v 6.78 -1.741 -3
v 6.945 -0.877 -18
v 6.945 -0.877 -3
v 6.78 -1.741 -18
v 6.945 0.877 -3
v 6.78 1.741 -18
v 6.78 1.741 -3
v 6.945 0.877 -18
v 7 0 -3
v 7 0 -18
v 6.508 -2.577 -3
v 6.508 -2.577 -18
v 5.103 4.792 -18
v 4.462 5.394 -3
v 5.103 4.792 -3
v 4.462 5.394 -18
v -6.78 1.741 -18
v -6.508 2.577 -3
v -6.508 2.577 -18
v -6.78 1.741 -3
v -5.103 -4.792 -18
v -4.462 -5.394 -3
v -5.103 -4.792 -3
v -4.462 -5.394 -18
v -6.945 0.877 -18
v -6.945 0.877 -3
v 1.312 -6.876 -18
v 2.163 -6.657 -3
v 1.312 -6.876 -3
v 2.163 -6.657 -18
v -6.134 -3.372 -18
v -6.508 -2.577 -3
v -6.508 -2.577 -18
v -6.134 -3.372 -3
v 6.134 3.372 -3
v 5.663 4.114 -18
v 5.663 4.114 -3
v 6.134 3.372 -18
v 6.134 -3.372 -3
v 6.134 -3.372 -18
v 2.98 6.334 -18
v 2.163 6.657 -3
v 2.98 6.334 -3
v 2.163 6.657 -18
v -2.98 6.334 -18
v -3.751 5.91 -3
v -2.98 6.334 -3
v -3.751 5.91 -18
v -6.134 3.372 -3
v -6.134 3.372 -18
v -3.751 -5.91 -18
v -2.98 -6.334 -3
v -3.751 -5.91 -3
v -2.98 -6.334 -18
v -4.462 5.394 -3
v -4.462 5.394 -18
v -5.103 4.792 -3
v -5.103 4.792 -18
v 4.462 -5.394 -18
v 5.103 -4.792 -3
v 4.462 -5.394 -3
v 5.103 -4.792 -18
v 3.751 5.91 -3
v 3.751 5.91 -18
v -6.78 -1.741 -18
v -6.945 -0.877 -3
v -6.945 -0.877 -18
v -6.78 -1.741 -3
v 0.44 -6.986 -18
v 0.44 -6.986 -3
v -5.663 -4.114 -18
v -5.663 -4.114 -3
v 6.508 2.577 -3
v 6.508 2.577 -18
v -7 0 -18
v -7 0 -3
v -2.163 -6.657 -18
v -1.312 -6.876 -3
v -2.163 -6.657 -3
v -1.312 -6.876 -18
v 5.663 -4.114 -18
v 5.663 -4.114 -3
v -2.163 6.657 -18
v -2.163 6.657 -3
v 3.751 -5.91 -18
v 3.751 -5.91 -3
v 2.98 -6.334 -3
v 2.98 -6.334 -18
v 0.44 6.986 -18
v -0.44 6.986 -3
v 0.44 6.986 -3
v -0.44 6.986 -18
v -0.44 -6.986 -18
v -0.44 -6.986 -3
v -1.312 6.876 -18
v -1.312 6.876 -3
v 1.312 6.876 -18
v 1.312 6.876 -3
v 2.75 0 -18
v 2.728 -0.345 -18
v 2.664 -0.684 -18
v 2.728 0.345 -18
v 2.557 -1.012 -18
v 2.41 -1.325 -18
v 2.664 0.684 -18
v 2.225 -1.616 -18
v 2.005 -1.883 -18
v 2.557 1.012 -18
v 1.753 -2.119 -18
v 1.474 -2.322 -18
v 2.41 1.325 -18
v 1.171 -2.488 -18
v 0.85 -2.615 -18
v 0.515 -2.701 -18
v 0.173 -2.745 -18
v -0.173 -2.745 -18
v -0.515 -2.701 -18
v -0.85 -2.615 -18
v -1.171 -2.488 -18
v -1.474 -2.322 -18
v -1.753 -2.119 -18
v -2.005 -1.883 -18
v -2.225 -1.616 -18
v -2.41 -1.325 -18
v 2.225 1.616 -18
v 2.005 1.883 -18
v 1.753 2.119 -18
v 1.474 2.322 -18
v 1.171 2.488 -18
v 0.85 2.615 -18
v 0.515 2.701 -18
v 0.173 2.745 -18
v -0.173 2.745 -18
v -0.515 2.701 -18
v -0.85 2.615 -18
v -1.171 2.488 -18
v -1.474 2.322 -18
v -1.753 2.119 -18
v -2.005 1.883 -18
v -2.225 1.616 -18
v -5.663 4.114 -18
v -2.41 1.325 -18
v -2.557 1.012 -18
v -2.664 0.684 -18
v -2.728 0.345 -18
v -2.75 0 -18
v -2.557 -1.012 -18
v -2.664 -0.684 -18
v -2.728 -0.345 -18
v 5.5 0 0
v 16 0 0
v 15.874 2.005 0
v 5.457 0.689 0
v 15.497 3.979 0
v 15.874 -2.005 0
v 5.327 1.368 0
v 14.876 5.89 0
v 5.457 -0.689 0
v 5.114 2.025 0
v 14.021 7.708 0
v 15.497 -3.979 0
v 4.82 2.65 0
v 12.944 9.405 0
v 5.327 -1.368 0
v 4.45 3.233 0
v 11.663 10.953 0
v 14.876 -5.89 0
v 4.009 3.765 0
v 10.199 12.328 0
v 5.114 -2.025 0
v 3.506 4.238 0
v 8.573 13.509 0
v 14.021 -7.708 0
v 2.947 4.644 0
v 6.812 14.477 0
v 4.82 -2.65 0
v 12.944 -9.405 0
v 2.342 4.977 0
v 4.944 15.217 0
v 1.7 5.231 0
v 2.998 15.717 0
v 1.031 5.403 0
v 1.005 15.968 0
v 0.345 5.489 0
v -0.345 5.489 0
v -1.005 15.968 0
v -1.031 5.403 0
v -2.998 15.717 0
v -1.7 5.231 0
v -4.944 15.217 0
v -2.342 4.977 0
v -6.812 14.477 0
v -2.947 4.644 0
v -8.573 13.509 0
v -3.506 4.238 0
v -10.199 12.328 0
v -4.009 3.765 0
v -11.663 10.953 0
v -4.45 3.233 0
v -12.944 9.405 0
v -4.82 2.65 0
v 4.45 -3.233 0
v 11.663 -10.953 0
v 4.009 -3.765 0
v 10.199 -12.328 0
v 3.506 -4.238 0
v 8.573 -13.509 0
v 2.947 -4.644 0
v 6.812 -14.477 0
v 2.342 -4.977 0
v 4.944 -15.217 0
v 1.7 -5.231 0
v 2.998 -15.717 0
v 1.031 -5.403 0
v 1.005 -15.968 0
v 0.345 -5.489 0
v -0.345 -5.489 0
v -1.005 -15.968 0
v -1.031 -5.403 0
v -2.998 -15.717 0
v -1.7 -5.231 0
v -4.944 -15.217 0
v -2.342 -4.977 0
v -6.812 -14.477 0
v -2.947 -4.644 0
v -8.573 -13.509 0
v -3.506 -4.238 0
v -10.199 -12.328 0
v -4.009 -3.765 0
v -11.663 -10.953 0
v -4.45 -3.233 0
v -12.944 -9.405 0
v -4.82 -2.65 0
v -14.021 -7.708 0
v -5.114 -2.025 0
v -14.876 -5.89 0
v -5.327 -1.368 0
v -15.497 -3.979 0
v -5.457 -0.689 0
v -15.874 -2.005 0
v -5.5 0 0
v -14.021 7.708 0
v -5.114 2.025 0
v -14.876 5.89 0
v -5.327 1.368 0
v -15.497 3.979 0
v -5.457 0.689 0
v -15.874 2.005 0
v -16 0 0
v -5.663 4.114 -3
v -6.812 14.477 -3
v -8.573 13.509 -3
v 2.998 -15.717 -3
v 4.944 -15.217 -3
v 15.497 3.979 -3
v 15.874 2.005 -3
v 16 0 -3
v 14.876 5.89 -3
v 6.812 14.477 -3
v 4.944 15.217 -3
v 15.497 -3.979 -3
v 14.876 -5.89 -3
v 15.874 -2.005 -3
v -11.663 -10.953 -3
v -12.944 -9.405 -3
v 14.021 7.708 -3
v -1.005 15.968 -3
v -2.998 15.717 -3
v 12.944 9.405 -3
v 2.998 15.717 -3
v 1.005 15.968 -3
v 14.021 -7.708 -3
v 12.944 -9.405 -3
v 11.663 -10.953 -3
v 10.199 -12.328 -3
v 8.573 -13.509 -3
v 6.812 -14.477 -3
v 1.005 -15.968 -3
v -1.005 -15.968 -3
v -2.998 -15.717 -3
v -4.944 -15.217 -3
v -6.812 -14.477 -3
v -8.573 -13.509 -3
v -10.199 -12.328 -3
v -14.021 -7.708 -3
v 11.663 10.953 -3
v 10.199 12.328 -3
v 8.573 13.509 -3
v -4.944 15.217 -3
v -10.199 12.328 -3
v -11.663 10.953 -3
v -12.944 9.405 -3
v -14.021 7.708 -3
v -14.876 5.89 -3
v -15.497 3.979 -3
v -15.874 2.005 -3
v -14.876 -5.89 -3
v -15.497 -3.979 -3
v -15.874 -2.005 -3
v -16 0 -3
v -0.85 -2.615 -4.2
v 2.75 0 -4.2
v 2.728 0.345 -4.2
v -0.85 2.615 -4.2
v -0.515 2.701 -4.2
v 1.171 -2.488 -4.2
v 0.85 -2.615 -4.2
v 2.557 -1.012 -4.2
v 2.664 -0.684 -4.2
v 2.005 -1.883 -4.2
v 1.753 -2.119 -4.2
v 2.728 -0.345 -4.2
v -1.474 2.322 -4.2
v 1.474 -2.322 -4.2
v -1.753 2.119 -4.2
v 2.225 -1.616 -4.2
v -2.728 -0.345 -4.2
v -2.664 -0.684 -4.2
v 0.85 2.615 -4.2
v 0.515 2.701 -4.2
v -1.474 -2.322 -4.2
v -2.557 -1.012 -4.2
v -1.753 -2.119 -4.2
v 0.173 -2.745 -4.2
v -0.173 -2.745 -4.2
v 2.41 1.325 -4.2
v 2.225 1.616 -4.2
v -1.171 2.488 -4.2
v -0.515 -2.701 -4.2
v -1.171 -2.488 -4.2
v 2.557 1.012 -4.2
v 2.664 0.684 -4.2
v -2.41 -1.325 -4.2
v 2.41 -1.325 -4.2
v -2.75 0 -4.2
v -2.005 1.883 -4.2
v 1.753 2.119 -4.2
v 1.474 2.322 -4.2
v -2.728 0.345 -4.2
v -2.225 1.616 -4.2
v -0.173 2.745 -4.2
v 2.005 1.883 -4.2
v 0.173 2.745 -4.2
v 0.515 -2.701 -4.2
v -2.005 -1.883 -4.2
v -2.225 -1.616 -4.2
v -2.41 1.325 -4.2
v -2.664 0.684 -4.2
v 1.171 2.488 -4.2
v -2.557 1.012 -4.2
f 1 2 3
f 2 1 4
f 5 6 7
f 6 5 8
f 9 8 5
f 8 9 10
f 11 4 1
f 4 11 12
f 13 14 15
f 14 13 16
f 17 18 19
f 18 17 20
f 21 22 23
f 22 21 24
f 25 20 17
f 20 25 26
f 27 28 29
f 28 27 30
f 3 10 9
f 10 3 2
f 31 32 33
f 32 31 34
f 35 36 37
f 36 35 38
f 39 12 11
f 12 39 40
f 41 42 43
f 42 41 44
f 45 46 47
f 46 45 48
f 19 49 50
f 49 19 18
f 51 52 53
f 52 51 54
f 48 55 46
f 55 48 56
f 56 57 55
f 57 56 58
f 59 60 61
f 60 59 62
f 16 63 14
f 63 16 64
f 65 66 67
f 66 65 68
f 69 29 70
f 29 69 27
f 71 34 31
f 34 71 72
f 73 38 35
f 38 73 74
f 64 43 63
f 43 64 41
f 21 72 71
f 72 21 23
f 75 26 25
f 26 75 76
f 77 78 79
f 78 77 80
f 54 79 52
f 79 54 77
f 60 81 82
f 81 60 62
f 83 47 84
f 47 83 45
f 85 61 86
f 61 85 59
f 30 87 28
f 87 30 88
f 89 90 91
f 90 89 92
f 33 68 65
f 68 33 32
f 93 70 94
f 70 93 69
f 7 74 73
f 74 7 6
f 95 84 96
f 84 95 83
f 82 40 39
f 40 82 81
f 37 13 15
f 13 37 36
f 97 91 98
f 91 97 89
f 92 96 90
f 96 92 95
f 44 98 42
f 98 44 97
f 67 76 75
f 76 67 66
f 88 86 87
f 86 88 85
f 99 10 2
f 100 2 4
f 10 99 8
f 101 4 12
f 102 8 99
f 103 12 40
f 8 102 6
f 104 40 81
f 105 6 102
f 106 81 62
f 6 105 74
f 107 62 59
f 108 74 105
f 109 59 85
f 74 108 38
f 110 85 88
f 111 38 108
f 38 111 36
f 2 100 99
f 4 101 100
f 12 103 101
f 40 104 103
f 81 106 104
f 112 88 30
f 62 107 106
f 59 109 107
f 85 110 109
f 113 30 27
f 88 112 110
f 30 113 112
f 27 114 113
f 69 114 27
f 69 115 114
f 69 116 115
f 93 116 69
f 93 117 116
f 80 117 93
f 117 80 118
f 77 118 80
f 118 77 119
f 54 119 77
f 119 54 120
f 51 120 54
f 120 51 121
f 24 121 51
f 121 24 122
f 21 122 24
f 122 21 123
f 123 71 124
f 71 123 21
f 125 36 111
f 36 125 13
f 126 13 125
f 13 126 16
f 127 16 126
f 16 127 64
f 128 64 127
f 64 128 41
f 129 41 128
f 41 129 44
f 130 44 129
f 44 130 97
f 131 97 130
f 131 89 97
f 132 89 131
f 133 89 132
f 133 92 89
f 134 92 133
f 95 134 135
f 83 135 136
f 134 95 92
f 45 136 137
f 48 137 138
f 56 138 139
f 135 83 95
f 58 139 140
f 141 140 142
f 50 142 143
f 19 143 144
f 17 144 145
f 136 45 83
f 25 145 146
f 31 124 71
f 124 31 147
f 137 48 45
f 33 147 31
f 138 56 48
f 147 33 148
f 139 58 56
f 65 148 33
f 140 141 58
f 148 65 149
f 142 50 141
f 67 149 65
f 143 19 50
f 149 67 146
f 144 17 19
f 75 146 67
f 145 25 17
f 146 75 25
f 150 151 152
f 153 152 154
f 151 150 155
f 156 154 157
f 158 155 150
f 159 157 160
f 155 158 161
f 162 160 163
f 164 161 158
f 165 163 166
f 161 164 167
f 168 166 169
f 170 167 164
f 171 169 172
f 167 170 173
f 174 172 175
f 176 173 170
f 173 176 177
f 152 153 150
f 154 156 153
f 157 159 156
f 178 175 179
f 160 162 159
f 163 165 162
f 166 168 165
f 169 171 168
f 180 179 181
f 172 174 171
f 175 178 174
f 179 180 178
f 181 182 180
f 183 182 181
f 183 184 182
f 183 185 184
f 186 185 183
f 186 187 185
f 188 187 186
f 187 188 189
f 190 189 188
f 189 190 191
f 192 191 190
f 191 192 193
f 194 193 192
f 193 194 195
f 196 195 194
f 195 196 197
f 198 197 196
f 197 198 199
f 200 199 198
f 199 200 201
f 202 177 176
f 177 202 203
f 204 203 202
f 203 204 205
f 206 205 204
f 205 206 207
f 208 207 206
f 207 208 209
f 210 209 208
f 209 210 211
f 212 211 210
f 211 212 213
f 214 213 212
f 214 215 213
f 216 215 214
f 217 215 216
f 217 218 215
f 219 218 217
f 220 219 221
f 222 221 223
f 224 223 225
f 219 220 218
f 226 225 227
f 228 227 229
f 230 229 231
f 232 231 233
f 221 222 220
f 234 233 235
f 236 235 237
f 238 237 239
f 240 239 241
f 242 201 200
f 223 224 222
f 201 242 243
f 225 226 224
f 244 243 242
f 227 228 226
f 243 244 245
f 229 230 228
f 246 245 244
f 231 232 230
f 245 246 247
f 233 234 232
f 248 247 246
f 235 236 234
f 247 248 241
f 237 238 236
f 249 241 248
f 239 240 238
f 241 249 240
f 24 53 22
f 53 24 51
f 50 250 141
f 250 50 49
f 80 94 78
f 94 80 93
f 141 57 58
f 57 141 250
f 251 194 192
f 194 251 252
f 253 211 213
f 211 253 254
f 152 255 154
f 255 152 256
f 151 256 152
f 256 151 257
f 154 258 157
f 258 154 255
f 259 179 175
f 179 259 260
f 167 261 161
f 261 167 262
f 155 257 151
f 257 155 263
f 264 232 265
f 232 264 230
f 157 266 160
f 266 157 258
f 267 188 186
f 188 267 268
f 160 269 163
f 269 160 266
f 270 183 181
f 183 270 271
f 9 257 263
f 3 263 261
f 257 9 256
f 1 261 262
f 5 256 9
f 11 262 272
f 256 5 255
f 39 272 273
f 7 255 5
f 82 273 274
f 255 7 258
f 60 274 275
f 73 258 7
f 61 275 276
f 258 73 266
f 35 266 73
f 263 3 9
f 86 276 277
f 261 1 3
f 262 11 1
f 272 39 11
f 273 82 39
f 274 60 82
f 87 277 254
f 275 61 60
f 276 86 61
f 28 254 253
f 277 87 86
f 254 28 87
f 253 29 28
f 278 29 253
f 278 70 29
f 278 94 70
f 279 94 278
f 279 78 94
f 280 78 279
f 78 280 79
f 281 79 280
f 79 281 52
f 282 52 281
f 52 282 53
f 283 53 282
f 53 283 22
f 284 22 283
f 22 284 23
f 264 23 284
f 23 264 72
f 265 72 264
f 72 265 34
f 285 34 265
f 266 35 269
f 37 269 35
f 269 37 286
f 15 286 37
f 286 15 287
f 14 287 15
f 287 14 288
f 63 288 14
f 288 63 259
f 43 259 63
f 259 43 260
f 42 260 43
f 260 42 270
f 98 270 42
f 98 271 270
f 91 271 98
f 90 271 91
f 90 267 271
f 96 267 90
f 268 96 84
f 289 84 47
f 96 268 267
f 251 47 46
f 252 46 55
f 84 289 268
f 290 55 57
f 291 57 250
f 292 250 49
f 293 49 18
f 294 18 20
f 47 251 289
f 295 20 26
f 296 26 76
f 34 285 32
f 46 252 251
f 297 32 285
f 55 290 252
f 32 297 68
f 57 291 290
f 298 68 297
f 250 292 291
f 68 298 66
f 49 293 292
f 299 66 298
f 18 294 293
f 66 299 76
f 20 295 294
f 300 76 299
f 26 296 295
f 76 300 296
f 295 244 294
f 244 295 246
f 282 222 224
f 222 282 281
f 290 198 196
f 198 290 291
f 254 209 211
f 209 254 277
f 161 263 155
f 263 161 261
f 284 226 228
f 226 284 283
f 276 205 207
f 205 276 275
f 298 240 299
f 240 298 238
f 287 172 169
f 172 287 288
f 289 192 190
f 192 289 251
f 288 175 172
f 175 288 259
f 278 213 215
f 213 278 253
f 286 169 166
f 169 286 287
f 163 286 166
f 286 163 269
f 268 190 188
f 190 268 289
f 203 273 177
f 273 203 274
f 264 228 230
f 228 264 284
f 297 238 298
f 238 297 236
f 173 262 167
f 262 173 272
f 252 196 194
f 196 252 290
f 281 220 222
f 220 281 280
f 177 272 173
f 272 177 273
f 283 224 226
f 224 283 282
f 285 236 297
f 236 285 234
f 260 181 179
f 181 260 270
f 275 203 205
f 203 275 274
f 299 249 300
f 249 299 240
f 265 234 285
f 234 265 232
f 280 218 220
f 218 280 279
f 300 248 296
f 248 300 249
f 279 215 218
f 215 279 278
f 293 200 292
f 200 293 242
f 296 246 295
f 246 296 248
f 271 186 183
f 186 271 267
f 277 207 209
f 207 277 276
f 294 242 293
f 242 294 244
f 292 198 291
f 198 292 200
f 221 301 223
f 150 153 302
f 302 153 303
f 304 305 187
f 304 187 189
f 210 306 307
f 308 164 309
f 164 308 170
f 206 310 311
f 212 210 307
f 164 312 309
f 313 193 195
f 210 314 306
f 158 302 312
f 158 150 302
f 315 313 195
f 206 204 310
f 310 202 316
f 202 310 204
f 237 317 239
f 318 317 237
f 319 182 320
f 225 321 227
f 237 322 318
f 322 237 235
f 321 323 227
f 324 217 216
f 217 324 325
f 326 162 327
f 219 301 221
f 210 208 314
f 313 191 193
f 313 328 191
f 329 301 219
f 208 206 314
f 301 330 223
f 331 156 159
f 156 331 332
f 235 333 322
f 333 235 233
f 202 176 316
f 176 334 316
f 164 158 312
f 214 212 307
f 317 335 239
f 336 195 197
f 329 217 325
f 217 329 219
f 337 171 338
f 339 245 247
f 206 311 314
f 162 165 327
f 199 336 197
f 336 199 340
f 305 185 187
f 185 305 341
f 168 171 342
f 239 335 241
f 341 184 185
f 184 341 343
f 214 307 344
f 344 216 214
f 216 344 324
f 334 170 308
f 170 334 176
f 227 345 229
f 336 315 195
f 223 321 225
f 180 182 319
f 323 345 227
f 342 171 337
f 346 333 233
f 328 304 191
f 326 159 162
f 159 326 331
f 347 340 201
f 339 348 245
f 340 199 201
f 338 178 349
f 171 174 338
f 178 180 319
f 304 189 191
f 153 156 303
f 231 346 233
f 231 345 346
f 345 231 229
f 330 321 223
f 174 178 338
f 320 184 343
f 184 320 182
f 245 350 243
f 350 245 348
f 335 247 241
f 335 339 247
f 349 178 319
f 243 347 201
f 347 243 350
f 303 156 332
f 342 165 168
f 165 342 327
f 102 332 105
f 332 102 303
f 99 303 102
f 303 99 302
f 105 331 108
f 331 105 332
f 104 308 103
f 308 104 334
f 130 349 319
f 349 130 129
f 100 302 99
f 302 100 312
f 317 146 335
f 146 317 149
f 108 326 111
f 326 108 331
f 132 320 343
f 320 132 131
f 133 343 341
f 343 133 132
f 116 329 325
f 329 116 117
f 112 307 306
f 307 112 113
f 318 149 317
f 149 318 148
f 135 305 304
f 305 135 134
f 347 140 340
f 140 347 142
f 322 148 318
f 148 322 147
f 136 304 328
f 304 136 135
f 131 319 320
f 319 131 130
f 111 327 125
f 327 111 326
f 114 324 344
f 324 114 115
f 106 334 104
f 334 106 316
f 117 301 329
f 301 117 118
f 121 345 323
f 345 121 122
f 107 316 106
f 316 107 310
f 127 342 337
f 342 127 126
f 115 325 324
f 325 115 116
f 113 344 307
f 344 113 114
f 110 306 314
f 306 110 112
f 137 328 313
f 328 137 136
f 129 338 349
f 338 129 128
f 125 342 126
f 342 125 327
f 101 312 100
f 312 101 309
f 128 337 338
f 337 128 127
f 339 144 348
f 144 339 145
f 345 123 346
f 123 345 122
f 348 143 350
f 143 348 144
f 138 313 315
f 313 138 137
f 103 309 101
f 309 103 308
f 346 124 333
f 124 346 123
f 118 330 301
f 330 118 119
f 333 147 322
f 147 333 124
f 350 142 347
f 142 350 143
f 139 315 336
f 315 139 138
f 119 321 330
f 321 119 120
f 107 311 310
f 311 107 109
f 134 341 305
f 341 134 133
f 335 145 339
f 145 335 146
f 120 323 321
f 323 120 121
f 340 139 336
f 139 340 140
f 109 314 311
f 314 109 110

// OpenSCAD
$fn = 50;


difference() {
	union() {
		translate(v = [0, 0, -18.0000000000]) {
			cylinder(h = 18, r = 7.0000000000);
		}
		translate(v = [0, 0, -3.0000000000]) {
			cylinder(h = 3, r = 16.0000000000);
		}
	}
	union() {
		translate(v = [0, 0, 0]) {
			rotate(a = [0, 0, 0]) {
				difference() {
					union() {
						#translate(v = [0, 0, -18.0000000000]) {
							cylinder(h = 18, r = 2.2500000000);
						}
						#translate(v = [0, 0, -4.2000000000]) {
							cylinder(h = 4.2000000000, r = 7.0000000000, r1 = 2.7500000000, r2 = 5.5000000000);
						}
						#translate(v = [0, 0, -18.0000000000]) {
							cylinder(h = 18, r = 2.7500000000);
						}
						#translate(v = [0, 0, -18.0000000000]) {
							cylinder(h = 18, r = 2.2500000000);
						}
					}
					union();
				}
			}
		}
	}
}
